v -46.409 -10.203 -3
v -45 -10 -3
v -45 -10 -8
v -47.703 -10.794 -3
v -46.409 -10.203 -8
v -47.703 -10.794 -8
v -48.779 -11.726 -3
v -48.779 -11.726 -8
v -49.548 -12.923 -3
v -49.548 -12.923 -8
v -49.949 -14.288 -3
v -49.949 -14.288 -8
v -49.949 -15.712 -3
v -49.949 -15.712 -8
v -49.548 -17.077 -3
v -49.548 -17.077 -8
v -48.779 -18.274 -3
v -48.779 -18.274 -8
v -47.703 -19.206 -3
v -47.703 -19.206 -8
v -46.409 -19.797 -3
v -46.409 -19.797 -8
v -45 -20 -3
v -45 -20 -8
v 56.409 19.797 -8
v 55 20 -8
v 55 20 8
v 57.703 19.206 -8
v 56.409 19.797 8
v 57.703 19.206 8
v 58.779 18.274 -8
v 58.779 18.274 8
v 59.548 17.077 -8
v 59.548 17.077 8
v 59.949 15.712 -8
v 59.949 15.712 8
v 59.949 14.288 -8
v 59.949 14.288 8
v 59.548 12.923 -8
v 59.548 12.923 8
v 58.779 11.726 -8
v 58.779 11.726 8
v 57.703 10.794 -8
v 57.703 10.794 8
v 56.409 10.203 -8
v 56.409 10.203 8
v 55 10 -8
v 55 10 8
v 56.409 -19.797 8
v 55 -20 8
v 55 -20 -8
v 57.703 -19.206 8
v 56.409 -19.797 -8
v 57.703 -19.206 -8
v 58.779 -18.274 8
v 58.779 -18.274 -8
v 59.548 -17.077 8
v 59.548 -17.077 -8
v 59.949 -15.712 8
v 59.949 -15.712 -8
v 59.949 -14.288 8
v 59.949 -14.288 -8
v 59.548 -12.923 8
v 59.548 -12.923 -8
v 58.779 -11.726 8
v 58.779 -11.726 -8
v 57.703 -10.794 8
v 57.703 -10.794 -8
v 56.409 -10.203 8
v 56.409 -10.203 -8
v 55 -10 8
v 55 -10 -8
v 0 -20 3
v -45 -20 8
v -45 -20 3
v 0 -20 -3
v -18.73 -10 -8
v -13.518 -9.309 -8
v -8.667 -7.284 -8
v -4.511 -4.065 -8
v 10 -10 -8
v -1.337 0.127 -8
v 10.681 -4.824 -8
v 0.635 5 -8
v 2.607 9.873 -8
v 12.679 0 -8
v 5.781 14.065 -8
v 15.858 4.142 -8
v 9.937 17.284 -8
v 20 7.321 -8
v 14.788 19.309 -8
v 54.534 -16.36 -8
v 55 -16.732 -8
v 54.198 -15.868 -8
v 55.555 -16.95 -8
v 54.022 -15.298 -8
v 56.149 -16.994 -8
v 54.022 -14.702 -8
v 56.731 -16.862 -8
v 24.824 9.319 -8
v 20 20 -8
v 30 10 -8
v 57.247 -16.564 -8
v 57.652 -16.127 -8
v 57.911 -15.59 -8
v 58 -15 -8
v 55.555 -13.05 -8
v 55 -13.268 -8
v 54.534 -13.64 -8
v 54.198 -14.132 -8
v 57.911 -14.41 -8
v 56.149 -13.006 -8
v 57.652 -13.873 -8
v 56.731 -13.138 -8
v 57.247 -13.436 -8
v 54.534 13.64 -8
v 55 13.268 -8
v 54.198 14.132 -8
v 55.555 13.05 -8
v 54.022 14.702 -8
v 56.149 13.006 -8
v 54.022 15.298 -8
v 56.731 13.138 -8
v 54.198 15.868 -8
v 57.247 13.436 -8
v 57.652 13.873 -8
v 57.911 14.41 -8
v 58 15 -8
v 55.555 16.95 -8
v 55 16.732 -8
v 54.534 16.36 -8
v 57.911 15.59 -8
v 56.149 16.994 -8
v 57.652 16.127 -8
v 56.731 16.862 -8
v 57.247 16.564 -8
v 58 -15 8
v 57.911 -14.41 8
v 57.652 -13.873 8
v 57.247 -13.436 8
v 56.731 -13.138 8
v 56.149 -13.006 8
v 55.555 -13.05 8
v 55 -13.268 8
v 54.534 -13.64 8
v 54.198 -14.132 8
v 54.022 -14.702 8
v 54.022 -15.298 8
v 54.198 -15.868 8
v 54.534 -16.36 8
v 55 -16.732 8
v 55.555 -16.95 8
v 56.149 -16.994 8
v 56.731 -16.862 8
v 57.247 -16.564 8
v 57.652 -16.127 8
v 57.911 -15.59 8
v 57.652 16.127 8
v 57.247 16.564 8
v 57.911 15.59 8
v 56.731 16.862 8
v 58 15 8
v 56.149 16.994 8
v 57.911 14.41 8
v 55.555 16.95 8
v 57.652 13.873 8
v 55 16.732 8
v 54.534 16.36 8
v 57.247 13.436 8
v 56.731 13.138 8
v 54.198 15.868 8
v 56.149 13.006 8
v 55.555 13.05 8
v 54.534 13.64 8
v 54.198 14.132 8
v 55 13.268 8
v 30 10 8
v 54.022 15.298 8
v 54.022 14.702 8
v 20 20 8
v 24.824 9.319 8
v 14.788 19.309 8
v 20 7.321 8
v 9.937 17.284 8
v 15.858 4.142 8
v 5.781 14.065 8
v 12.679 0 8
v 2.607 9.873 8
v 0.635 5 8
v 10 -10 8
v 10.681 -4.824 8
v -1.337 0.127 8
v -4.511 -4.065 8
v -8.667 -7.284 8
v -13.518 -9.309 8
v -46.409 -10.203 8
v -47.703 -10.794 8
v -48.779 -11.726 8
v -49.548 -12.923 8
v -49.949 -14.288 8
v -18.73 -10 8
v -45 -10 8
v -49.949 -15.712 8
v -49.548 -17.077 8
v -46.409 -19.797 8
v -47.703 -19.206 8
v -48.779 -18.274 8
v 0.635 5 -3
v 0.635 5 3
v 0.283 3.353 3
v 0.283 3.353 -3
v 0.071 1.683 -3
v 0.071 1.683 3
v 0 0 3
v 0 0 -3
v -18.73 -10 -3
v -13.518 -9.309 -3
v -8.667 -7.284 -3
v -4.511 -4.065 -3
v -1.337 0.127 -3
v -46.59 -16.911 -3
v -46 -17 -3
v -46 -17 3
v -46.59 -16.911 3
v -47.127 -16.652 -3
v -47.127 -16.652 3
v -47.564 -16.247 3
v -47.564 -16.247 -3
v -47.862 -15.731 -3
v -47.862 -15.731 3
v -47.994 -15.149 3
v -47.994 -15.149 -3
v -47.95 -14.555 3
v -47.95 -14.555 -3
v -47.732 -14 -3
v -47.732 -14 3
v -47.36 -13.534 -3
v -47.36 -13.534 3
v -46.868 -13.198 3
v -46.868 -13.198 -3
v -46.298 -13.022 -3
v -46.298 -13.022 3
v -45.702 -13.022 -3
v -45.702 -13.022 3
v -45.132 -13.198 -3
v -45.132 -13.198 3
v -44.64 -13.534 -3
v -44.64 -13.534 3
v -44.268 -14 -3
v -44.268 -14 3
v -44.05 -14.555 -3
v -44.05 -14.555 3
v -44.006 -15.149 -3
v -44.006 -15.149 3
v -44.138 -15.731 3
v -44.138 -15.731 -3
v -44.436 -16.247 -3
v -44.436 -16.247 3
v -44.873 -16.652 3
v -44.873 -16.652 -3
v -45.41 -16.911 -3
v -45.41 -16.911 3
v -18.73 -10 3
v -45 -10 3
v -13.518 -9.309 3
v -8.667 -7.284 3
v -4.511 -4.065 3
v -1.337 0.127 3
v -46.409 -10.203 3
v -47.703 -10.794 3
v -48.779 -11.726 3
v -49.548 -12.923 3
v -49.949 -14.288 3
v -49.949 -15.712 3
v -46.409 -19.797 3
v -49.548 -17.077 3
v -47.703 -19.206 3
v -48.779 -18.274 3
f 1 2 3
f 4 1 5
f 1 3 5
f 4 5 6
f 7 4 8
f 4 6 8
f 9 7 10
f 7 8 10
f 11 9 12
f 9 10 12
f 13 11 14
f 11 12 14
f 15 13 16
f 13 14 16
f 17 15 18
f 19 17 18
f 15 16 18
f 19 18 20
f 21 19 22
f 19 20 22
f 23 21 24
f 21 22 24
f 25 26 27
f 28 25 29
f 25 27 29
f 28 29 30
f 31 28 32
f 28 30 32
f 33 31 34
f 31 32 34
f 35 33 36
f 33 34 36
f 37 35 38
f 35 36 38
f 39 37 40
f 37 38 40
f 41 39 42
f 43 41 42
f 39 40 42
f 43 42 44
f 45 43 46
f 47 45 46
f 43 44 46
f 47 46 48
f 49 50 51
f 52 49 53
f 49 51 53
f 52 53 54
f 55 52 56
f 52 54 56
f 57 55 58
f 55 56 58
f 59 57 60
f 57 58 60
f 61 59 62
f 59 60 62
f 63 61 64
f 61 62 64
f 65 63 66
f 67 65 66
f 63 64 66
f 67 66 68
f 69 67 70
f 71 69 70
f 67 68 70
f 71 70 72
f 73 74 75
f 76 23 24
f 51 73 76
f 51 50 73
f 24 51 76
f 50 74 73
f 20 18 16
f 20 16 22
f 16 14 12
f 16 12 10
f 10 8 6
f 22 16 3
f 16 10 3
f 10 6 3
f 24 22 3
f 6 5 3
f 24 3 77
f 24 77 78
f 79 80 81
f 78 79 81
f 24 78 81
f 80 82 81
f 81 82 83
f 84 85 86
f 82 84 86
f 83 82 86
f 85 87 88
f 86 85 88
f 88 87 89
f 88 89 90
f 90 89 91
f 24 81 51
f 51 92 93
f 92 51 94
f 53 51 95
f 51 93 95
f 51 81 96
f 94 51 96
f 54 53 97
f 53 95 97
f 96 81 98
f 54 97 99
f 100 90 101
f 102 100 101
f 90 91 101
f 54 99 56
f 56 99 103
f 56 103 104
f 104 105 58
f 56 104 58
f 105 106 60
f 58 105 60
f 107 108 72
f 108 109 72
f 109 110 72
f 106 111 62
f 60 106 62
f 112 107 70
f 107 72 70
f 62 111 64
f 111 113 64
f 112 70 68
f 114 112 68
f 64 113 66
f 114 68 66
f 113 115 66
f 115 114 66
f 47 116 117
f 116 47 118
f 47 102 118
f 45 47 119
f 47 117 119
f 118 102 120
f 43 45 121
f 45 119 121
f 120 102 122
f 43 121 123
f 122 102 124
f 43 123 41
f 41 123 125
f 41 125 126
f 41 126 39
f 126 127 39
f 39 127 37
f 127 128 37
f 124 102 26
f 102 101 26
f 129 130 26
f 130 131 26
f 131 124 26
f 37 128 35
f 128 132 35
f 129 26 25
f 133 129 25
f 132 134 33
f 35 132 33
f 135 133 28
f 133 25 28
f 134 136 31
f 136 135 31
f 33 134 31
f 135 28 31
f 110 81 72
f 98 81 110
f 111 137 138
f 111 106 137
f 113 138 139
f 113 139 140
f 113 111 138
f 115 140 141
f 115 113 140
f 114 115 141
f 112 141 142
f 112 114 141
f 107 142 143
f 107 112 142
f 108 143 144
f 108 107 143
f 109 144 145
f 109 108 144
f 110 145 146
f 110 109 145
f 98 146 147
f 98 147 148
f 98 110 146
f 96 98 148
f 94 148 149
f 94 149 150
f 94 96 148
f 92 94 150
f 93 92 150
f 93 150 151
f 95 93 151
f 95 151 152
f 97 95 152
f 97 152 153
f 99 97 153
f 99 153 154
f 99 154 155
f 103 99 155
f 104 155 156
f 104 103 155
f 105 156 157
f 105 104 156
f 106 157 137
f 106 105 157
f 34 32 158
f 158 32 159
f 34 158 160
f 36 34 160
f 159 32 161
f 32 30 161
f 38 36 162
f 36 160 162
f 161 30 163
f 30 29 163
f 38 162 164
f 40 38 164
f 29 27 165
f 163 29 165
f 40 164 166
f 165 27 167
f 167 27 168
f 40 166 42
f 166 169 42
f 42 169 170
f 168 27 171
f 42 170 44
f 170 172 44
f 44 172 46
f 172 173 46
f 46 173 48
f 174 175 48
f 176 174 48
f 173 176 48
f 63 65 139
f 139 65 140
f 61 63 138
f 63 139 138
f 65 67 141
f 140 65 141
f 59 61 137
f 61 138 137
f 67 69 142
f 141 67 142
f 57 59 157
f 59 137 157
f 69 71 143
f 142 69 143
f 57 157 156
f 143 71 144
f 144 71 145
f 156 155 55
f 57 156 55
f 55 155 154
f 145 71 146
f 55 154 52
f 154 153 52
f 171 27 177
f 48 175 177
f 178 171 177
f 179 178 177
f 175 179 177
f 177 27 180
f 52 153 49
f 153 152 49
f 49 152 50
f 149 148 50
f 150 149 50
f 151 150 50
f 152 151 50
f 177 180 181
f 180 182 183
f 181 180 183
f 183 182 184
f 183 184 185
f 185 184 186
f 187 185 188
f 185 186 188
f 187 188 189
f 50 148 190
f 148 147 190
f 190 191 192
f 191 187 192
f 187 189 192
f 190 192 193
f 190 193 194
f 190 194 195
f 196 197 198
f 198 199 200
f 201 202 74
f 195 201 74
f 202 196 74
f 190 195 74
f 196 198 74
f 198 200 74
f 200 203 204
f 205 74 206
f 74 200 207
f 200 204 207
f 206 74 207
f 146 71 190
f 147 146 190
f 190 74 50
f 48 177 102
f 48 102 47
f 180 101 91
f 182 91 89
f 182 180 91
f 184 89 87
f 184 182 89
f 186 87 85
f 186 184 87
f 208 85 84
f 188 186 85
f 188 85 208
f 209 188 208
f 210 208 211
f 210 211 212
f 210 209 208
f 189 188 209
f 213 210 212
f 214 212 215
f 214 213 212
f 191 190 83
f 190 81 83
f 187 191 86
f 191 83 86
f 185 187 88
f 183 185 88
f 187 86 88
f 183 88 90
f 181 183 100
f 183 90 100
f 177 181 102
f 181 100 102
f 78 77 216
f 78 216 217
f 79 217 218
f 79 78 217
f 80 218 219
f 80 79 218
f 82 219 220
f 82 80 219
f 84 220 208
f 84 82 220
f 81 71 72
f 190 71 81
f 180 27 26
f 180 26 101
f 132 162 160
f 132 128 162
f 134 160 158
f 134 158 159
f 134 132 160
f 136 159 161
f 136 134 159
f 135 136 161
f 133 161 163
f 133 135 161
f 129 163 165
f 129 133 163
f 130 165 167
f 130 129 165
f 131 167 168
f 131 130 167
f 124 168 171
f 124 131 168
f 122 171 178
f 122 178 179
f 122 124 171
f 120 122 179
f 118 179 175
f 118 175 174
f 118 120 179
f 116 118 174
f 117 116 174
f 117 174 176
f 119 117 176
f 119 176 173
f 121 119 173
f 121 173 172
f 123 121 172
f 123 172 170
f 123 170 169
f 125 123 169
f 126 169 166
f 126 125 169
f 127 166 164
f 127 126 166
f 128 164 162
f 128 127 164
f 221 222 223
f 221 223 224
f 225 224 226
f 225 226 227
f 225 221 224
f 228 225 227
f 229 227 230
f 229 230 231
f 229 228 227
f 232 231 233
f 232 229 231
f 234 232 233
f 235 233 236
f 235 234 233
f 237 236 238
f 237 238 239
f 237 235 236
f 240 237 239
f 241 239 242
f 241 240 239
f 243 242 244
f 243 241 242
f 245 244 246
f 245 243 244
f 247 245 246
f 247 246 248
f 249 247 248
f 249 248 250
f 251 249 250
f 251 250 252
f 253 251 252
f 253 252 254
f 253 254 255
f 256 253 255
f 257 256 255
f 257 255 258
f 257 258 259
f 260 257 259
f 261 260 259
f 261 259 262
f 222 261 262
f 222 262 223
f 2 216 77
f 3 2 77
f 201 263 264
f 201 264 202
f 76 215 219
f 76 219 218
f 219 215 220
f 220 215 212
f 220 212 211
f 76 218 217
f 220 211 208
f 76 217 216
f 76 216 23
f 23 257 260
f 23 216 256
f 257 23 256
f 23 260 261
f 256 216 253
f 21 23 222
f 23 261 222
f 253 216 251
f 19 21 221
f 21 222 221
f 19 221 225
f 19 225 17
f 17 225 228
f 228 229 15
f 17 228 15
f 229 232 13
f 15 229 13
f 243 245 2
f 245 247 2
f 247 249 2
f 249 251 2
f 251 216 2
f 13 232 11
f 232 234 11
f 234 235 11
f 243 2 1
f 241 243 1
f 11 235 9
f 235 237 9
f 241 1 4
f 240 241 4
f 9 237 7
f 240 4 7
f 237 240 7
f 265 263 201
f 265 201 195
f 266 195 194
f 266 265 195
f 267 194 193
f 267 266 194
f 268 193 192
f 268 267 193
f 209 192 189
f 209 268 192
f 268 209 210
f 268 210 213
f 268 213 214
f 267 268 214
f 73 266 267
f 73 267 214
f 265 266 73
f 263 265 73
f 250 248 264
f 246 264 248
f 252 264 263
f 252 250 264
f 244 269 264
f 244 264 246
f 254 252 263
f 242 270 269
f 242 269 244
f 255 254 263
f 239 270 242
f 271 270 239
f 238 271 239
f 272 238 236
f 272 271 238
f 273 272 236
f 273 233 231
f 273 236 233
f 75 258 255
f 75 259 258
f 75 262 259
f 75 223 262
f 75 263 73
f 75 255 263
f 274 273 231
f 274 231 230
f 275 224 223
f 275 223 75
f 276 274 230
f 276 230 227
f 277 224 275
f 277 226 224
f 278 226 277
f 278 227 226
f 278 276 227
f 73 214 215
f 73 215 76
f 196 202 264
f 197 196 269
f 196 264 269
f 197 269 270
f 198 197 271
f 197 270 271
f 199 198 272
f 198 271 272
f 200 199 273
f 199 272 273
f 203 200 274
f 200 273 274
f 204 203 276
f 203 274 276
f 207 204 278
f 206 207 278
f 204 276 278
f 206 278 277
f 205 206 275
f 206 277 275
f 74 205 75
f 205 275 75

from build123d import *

# Parameters (mm, degrees)
SKETCH1_R           = 2
BOSS_EXTRUDE1_DEPTH = 8
SKETCH2_W           = 5
SKETCH2_H           = 10
BOSS_EXTRUDE2_DEPTH = 50
SKETCH3_R           = 2
BOSS_EXTRUDE3_DEPTH = 5
FILLET1_R           = 20
FILLET2_R           = 20
FILLET3_R           = 20
FILLET4_R           = 5


# Some blends are built 0.0001 mm under size
with BuildPart() as part:
    # Sketch1 → Boss-Extrude1 (new body)
    with BuildSketch(Plane.XY):
        Polygon((60, 20), (0, 20), (0, 0), (0, -20), (60, -20), (60, -10), (10, -10), (10, 0), (10, 10), (60, 10), align=None)
        with Locations((56, 15)):
            Circle(SKETCH1_R, mode=Mode.SUBTRACT)
        with Locations((56, -15)):
            Circle(SKETCH1_R, mode=Mode.SUBTRACT)
    boss_extrude1 = extrude(amount=BOSS_EXTRUDE1_DEPTH)

    # Sketch2 → Boss-Extrude2 (add)
    with BuildSketch(Plane.ZY):
        with Locations((5.5, -15)):
            Rectangle(SKETCH2_W, SKETCH2_H)
    boss_extrude2 = extrude(amount=BOSS_EXTRUDE2_DEPTH)

    # Sketch3 → Boss-Extrude3 (add)
    with BuildSketch(Plane(origin=(0, 0, 3), x_dir=(-1, 0, 0), z_dir=(0, 0, -1))):
        with Locations(Location((46, -15, 0), (0, 0, 270))):
            Circle(SKETCH3_R)
    boss_extrude3 = extrude(amount=BOSS_EXTRUDE3_DEPTH)

    # Mirror1: Boss-Extrude1, Boss-Extrude2, Boss-Extrude3 across plane
    add(boss_extrude1.mirror(Plane.XY))
    add(boss_extrude2.mirror(Plane.XY))
    add(boss_extrude3.mirror(Plane.XY))

    # Fillet1
    fillet1_edges = [part.edges().sort_by_distance(p)[0] for p in [
        (10, 10, 0),
    ]]
    fillet(fillet1_edges, radius=FILLET1_R - 0.0001)  # a hair under: the kernel refuses the full size

    # Fillet2
    fillet2_edges = [part.edges().sort_by_distance(p)[0] for p in [
        (0, 20, 0),
    ]]
    fillet(fillet2_edges, radius=FILLET2_R)

    # Fillet3
    # the kernel refuses this fillet: 20 mm, written as the material it adds along each edge
    with BuildSketch(Plane(origin=(0, -10, -43.824583655), x_dir=(0.042300987596812424, 0.9991049126334702, 0), z_dir=(0, 0, 1))) as fillet3_piece_1_section:
        with BuildLine():
            CenterArc((19.1898078, 19.559088377), FILLET3_R, 182.424391449, 75.522487814)
            Line((-0.792290453, 18.713068625), (-2.790500278, 18.62846665))
            Line((-2.790500278, 18.62846665), (-1.998209825, -0.084601975))
            Line((-1.998209825, -0.084601975), (0.084601975, -1.998209825))
            ThreePointArc((0.084601975, -1.998209825), (10.075651102, -1.575199949), (14.595801393, -1.955908838))
            Line((14.595801393, -1.955908838), (15.013438339, 0))
        make_face()
    fillet3_piece_1 = extrude(amount=98.64916731, mode=Mode.PRIVATE)
    fillet3_piece_1 = split(fillet3_piece_1, bisect_by=Plane(origin=(-6.457889851, -5.843011077, -8), z_dir=(0, 0, 1)), keep=Keep.TOP, mode=Mode.PRIVATE)
    fillet3_piece_1 = split(fillet3_piece_1, bisect_by=Plane(origin=(-6.457889851, -5.843011077, -3), z_dir=(0, 0, -1)), keep=Keep.TOP, mode=Mode.PRIVATE)
    add(fillet3_piece_1)
    with BuildSketch(Plane(origin=(0, -10, 3), x_dir=(0.042300987596807504, 0.9991049126334706, 0), z_dir=(0, 0, 1))) as fillet3_piece_2:
        with BuildLine():
            CenterArc((19.1898078, 19.559088377), FILLET3_R, 182.424391449, 75.522487814)
            Line((-0.792290453, 18.713068625), (-2.790500278, 18.62846665))
            Line((-2.790500278, 18.62846665), (-1.998209825, -0.084601975))
            Line((-1.998209825, -0.084601975), (0.084601975, -1.998209825))
            ThreePointArc((0.084601975, -1.998209825), (10.075651102, -1.575199949), (14.595801393, -1.955908838))
            Line((14.595801393, -1.955908838), (15.013438339, 0))
        make_face()
    extrude(amount=5)
    with BuildSketch(Plane(origin=(0, -10, 43.824583655), x_dir=(0.042300987596812424, 0.9991049126334702, 0), z_dir=(0, 0, -1))) as fillet3_piece_3_section:
        with BuildLine():
            CenterArc((19.1898078, -19.559088377), FILLET3_R, 102.053120737, 75.522487814)
            Line((-0.792290453, -18.713068625), (-2.790500278, -18.62846665))
            Line((-2.790500278, -18.62846665), (-1.998209825, 0.084601975))
            Line((-1.998209825, 0.084601975), (0.084601975, 1.998209825))
            ThreePointArc((0.084601975, 1.998209825), (10.075651102, 1.575199949), (14.595801393, 1.955908838))
            Line((14.595801393, 1.955908838), (15.013438339, 0))
        make_face()
    fillet3_piece_3 = extrude(amount=98.64916731, mode=Mode.PRIVATE)
    fillet3_piece_3 = split(fillet3_piece_3, bisect_by=Plane(origin=(-6.457889851, -5.843011077, 8), z_dir=(0, 0, -1)), keep=Keep.TOP, mode=Mode.PRIVATE)
    fillet3_piece_3 = split(fillet3_piece_3, bisect_by=Plane(origin=(-6.457889851, -5.843011077, 3), z_dir=(0, 0, 1)), keep=Keep.TOP, mode=Mode.PRIVATE)
    add(fillet3_piece_3)
    with BuildSketch(Plane(origin=(0, -10, -3), x_dir=(0.042300987596807504, 0.9991049126334706, 0), z_dir=(0, 0, -1))) as fillet3_piece_4:
        with BuildLine():
            CenterArc((19.1898078, -19.559088377), FILLET3_R, 102.053120737, 75.522487814)
            Line((-0.792290453, -18.713068625), (-2.790500278, -18.62846665))
            Line((-2.790500278, -18.62846665), (-1.998209825, 0.084601975))
            Line((-1.998209825, 0.084601975), (0.084601975, 1.998209825))
            ThreePointArc((0.084601975, 1.998209825), (10.075651102, 1.575199949), (14.595801393, 1.955908838))
            Line((14.595801393, 1.955908838), (15.013438339, 0))
        make_face()
    extrude(amount=5)
    # the kernel refuses this fillet: 20 mm, written as the material it takes off along each edge

    # Fillet4
    # the kernel refuses this fillet: 5 mm, written as the material it takes off along each edge
    with BuildSketch(Plane(origin=(60, 10, 20.5), x_dir=(0, 1, 0), z_dir=(0, 0, -1)), Plane(origin=(60, 20, 20.5), x_dir=(-1, 0, 0), z_dir=(0, 0, -1))) as fillet4_piece_1:
        with BuildLine():
            CenterArc((FILLET4_R, -FILLET4_R), FILLET4_R, 90, 90)
            Line((0, -FILLET4_R), (0, 0))
            Line((0, 0), (FILLET4_R, 0))
        make_face()
    extrude(amount=41, mode=Mode.SUBTRACT)
    with BuildSketch(Plane(origin=(60, -10, -20.5), x_dir=(-1, 0, 0), z_dir=(0, 0, 1)), Plane(origin=(60, -20, -20.5), x_dir=(0, 1, 0), z_dir=(0, 0, 1))) as fillet4_piece_2:
        with BuildLine():
            CenterArc((FILLET4_R, FILLET4_R), FILLET4_R, 180, 90)
            Line((0, FILLET4_R), (0, 0))
            Line((0, 0), (FILLET4_R, 0))
        make_face()
    extrude(amount=41, mode=Mode.SUBTRACT)
    with BuildSketch(Plane(origin=(-50, -10, -9.5), x_dir=(1, 0, 0), z_dir=(0, 0, 1)), Plane(origin=(-50, -10, 9.5), x_dir=(0, -1, 0), z_dir=(0, 0, -1))) as fillet4_piece_3:
        with BuildLine():
            CenterArc((FILLET4_R, -FILLET4_R), FILLET4_R, 90, 90)
            Line((0, -FILLET4_R), (0, 0))
            Line((0, 0), (FILLET4_R, 0))
        make_face()
    extrude(amount=30, mode=Mode.SUBTRACT)
    with BuildSketch(Plane(origin=(-50, -20, 20.5), x_dir=(0, 1, 0), z_dir=(0, 0, -1)), Plane(origin=(-50, -20, -20.5), x_dir=(1, 0, 0), z_dir=(0, 0, 1))) as fillet4_piece_4:
        with BuildLine():
            CenterArc((FILLET4_R, FILLET4_R), FILLET4_R, 180, 90)
            Line((0, FILLET4_R), (0, 0))
            Line((0, 0), (FILLET4_R, 0))
        make_face()
    extrude(amount=30, mode=Mode.SUBTRACT)


solid = part.part
